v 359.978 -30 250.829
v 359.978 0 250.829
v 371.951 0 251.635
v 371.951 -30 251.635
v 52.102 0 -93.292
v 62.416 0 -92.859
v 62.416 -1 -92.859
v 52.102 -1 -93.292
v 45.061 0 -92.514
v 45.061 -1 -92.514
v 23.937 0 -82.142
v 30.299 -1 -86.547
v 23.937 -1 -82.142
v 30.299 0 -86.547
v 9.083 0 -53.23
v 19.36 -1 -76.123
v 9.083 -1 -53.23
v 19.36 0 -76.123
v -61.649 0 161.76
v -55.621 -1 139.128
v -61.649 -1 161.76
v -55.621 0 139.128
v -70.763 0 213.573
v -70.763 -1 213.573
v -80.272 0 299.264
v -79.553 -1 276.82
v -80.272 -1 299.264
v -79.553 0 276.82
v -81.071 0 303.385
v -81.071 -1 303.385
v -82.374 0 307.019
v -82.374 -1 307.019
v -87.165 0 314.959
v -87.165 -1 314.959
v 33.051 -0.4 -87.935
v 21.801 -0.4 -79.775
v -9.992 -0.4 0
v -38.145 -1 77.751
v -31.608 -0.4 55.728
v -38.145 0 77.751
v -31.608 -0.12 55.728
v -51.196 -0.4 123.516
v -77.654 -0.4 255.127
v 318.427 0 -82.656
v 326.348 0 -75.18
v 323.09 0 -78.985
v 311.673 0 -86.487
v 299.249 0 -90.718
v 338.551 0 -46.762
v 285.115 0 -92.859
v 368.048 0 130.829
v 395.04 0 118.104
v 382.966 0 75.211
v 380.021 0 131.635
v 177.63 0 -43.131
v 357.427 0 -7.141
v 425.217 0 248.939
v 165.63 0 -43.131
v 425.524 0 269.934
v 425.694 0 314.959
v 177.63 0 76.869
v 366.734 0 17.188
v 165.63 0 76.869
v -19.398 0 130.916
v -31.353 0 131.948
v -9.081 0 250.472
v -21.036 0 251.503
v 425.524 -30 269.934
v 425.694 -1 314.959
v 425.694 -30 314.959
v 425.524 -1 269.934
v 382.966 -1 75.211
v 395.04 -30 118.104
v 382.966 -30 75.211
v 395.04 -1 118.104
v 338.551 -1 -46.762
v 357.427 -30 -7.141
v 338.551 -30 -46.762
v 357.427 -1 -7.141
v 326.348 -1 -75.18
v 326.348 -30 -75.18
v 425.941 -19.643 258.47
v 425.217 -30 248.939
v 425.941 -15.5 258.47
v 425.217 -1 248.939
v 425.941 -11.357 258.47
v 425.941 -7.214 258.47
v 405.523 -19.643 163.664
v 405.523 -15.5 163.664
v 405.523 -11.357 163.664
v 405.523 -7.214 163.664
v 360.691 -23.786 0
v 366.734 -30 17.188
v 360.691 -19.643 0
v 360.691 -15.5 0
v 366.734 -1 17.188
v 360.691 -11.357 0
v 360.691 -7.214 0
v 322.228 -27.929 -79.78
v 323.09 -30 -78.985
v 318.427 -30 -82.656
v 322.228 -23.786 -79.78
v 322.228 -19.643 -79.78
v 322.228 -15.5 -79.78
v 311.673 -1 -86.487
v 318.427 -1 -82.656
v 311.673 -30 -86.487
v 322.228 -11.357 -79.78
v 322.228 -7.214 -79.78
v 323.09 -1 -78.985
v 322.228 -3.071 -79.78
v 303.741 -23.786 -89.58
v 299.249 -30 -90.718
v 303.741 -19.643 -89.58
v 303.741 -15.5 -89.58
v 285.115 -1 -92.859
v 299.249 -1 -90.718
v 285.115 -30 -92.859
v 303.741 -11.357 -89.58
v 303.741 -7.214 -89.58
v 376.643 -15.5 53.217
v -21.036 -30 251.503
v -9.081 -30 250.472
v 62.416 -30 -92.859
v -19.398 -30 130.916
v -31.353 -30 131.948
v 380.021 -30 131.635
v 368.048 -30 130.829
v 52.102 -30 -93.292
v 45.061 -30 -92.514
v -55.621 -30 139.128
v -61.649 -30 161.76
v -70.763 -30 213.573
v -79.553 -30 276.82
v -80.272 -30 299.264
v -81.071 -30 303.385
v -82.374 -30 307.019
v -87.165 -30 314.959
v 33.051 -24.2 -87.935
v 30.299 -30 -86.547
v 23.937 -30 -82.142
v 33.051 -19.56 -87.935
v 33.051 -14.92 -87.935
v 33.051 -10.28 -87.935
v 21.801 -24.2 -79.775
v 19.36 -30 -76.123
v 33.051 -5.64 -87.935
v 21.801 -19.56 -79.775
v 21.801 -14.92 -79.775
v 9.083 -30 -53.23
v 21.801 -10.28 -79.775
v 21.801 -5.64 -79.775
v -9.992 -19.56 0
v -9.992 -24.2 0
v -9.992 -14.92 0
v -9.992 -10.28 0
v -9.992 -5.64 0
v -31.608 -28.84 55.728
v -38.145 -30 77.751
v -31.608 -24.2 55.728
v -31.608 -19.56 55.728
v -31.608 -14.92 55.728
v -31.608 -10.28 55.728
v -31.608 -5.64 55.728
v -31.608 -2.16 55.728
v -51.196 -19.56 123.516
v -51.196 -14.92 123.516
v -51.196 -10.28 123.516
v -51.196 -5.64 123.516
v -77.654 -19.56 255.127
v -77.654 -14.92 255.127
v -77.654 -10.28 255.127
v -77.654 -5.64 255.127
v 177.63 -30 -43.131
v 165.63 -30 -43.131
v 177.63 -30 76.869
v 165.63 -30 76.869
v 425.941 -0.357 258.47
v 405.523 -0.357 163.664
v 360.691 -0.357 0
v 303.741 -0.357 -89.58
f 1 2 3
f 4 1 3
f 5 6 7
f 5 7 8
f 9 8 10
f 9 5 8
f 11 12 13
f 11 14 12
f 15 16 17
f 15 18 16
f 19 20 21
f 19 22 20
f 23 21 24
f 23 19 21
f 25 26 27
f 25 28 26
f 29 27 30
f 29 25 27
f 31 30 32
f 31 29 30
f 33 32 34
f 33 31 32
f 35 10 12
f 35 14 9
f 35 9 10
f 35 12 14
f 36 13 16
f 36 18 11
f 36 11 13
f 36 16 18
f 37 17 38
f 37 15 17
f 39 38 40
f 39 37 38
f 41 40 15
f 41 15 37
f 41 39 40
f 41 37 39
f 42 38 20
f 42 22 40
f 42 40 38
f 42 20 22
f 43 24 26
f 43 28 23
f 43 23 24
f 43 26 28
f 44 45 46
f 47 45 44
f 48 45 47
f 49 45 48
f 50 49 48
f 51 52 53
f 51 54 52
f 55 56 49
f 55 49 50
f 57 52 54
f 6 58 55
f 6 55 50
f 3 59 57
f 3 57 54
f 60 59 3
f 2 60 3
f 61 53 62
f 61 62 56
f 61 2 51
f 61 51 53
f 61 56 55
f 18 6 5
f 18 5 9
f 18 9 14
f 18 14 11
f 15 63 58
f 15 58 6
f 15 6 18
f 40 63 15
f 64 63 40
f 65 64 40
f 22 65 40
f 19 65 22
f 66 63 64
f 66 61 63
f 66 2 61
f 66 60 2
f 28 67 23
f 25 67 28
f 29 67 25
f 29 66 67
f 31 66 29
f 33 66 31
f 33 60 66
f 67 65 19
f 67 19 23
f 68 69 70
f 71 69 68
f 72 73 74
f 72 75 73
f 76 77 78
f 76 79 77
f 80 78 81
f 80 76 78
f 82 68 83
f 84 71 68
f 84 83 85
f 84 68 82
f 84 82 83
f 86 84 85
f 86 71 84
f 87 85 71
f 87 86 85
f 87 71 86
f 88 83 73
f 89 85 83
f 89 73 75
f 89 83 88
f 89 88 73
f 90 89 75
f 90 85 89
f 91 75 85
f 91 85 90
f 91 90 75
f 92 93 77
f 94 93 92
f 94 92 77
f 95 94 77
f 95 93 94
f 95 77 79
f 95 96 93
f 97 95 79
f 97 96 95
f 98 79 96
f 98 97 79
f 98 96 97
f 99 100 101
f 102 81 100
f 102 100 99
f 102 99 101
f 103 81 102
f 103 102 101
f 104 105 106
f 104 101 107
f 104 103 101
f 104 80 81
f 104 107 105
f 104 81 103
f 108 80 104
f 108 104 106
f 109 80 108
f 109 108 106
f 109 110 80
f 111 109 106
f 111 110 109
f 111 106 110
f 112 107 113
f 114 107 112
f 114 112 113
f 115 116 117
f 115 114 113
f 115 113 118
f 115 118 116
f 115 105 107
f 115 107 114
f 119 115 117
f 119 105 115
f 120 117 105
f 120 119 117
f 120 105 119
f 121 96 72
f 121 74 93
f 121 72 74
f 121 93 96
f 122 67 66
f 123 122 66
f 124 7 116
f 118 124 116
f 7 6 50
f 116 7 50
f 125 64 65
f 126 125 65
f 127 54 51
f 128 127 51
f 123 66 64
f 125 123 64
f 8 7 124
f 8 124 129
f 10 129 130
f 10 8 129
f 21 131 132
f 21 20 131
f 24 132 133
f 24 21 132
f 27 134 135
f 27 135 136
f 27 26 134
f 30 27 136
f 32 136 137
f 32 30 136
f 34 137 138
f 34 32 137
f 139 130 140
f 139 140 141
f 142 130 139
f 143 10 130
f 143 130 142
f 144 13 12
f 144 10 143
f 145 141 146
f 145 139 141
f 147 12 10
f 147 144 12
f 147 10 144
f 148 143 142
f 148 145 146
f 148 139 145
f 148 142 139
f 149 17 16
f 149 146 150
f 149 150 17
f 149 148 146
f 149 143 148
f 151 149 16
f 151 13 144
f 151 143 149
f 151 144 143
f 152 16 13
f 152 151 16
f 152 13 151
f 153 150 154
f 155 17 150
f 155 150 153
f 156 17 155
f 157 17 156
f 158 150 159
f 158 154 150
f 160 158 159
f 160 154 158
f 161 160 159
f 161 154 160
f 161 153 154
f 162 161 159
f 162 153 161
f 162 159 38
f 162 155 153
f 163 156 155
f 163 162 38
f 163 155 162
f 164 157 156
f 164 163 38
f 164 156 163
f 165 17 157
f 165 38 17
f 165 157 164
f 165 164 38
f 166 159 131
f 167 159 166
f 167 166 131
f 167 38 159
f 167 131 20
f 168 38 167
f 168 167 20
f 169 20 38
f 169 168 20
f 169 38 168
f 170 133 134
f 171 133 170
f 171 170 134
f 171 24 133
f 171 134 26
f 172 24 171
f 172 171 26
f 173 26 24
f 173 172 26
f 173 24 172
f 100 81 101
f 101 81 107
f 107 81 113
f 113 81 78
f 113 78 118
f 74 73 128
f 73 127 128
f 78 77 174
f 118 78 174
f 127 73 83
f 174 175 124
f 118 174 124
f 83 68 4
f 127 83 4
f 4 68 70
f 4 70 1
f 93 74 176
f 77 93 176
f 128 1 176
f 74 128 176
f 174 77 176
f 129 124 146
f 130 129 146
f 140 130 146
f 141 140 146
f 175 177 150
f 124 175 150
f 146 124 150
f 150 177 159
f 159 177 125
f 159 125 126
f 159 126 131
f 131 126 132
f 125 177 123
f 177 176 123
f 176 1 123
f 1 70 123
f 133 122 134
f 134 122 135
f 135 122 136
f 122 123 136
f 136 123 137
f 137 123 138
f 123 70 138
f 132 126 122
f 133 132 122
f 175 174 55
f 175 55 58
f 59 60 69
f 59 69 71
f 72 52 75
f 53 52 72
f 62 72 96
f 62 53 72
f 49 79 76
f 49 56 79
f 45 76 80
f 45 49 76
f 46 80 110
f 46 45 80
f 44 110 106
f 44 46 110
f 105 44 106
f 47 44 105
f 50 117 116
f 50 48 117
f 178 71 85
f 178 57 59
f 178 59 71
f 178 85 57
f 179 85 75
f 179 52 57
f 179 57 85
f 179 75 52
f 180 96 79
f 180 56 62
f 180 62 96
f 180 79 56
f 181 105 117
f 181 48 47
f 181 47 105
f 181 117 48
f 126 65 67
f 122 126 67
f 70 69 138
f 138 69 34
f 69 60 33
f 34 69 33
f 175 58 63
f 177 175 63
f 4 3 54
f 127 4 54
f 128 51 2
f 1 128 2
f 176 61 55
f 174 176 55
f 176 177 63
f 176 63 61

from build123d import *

# Parameters (mm, degrees)
F1_DEPTH = 1
F2_DEPTH = 30


# Not quite as in the source:
# - a feature names something its author has since deleted; it is built from what else it names


with BuildPart() as f1:
    # F0 (on Front) → F1 (new body)
    with BuildSketch(Plane.XZ):
        with BuildLine():
            add(Edge.make_bspline(
                [(425.694167614, 314.9593174458), (425.7411635664, 306.5823239179), (425.8353031998, 289.8020043845), (425.2213058119, 260.8518364023), (427.5387063586, 252.1953752472), (403.8651896897, 159.3760040825), (394.9399909924, 115.0243838579), (383.5203150006, 76.7031238113), (377.471464527, 57.9641754851), (362.9083470803, -2.5900933423), (345.2420278931, -25.5103393777), (334.7762850188, -58.8866961253), (326.7161367987, -76.5853711865), (317.2191947156, -83.9165976747), (303.6744184479, -90.5988549349), (291.5596455088, -92.0742269797), (285.1151227951, -92.8590595722)],
                knots=[0, 0, 0, 0, 0.0678721046, 0.1359575603, 0.1770145832, 0.3026200399, 0.39906864, 0.477401143, 0.5385059508, 0.6402294069, 0.7140746489, 0.7906886976, 0.8481181215, 0.8921936726, 0.9426518079, 1, 1, 1, 1], degree=3))
            Line((425.694167614, 314.9593174458), (-87.1654751293, 314.9593174458))
            add(Edge.make_bspline(
                [(62.4156631529, -92.8590595722), (57.0412799038, -93.2430841848), (46.7781604835, -93.9764316735), (34.762824297, -88.8868818229), (23.1000241889, -83.0505840006), (16.6656980071, -71.5759104343), (9.2152702261, -54.4172118892), (3.6540691421, -37.3377357492), (-3.596042902, -17.563668233), (-9.9992245943, -0.2210912492), (-16.1877714037, 17.9491344863), (-22.3081726097, 32.6077543724), (-26.6364419857, 45.9390385377), (-33.8295661577, 58.8731002038), (-38.5610064547, 81.4119978236), (-45.5627001907, 99.3824651482), (-50.8940688236, 123.5390915977), (-56.5692018159, 142.1363827936), (-60.9443389374, 157.495862805), (-63.7160996981, 172.3778561971), (-65.4868817968, 193.5985919764), (-70.5111342627, 211.0693794771), (-73.6652423642, 228.9065774682), (-78.0528125256, 255.4192638339), (-80.2249024033, 280.7772367064), (-79.1591451026, 303.4353757219), (-84.7282168765, 311.4512404644), (-87.1654751293, 314.9593174458)],
                knots=[0, 0, 0, 0, 0.0371469817, 0.070937239, 0.1041076852, 0.1377363763, 0.1783245219, 0.2187259528, 0.2617260214, 0.3025703504, 0.3437531553, 0.3813536818, 0.4160576409, 0.4522458314, 0.496957828, 0.5390308214, 0.5856683097, 0.6275330442, 0.6645798021, 0.7012650834, 0.7446384462, 0.7847130572, 0.8246319824, 0.8733648148, 0.9218849639, 0.9658135998, 1, 1, 1, 1], degree=3))
            Line((62.4156631529, -92.8590595722), (285.1151227951, -92.8590595722))
        make_face()
        Polygon((165.6303541942, 76.8693466235), (171.6303541942, 76.8693466235), (177.6303541942, 76.8693466235), (177.6303541942, -43.1306533765), (171.6303541942, -43.1306533765), (165.6303541942, -43.1306533765), align=None, mode=Mode.SUBTRACT)
        Polygon((-31.3533060253, 131.947606802), (-21.0363371185, 251.5032848461), (-9.0807693141, 250.4715879554), (-19.3977382209, 130.9159099113), align=None, mode=Mode.SUBTRACT)
        Polygon((359.9782669565, 250.8293367838), (371.9512232727, 251.634518161), (380.0212239228, 131.634518161), (368.0482676066, 130.8293367838), align=None, mode=Mode.SUBTRACT)
    extrude(amount=F1_DEPTH)

    # F0 (on Front) → F2 (join)
    with BuildSketch(Plane.XZ):
        with BuildLine():
            add(Edge.make_bspline(
                [(425.694167614, 314.9593174458), (425.7411635664, 306.5823239179), (425.8353031998, 289.8020043845), (425.2213058119, 260.8518364023), (427.5387063586, 252.1953752472), (403.8651896897, 159.3760040825), (394.9399909924, 115.0243838579), (383.5203150006, 76.7031238113), (377.471464527, 57.9641754851), (362.9083470803, -2.5900933423), (345.2420278931, -25.5103393777), (334.7762850188, -58.8866961253), (326.7161367987, -76.5853711865), (317.2191947156, -83.9165976747), (303.6744184479, -90.5988549349), (291.5596455088, -92.0742269797), (285.1151227951, -92.8590595722)],
                knots=[0, 0, 0, 0, 0.0678721046, 0.1359575603, 0.1770145832, 0.3026200399, 0.39906864, 0.477401143, 0.5385059508, 0.6402294069, 0.7140746489, 0.7906886976, 0.8481181215, 0.8921936726, 0.9426518079, 1, 1, 1, 1], degree=3))
            Line((425.694167614, 314.9593174458), (-87.1654751293, 314.9593174458))
            add(Edge.make_bspline(
                [(62.4156631529, -92.8590595722), (57.0412799038, -93.2430841848), (46.7781604835, -93.9764316735), (34.762824297, -88.8868818229), (23.1000241889, -83.0505840006), (16.6656980071, -71.5759104343), (9.2152702261, -54.4172118892), (3.6540691421, -37.3377357492), (-3.596042902, -17.563668233), (-9.9992245943, -0.2210912492), (-16.1877714037, 17.9491344863), (-22.3081726097, 32.6077543724), (-26.6364419857, 45.9390385377), (-33.8295661577, 58.8731002038), (-38.5610064547, 81.4119978236), (-45.5627001907, 99.3824651482), (-50.8940688236, 123.5390915977), (-56.5692018159, 142.1363827936), (-60.9443389374, 157.495862805), (-63.7160996981, 172.3778561971), (-65.4868817968, 193.5985919764), (-70.5111342627, 211.0693794771), (-73.6652423642, 228.9065774682), (-78.0528125256, 255.4192638339), (-80.2249024033, 280.7772367064), (-79.1591451026, 303.4353757219), (-84.7282168765, 311.4512404644), (-87.1654751293, 314.9593174458)],
                knots=[0, 0, 0, 0, 0.0371469817, 0.070937239, 0.1041076852, 0.1377363763, 0.1783245219, 0.2187259528, 0.2617260214, 0.3025703504, 0.3437531553, 0.3813536818, 0.4160576409, 0.4522458314, 0.496957828, 0.5390308214, 0.5856683097, 0.6275330442, 0.6645798021, 0.7012650834, 0.7446384462, 0.7847130572, 0.8246319824, 0.8733648148, 0.9218849639, 0.9658135998, 1, 1, 1, 1], degree=3))
            Line((62.4156631529, -92.8590595722), (285.1151227951, -92.8590595722))
        make_face()
        Polygon((165.6303541942, 76.8693466235), (171.6303541942, 76.8693466235), (177.6303541942, 76.8693466235), (177.6303541942, -43.1306533765), (171.6303541942, -43.1306533765), (165.6303541942, -43.1306533765), align=None, mode=Mode.SUBTRACT)
        Polygon((-31.3533060253, 131.947606802), (-21.0363371185, 251.5032848461), (-9.0807693141, 250.4715879554), (-19.3977382209, 130.9159099113), align=None, mode=Mode.SUBTRACT)
        Polygon((359.9782669565, 250.8293367838), (371.9512232727, 251.634518161), (380.0212239228, 131.634518161), (368.0482676066, 130.8293367838), align=None, mode=Mode.SUBTRACT)
    extrude(amount=F2_DEPTH)


solid = f1.part
